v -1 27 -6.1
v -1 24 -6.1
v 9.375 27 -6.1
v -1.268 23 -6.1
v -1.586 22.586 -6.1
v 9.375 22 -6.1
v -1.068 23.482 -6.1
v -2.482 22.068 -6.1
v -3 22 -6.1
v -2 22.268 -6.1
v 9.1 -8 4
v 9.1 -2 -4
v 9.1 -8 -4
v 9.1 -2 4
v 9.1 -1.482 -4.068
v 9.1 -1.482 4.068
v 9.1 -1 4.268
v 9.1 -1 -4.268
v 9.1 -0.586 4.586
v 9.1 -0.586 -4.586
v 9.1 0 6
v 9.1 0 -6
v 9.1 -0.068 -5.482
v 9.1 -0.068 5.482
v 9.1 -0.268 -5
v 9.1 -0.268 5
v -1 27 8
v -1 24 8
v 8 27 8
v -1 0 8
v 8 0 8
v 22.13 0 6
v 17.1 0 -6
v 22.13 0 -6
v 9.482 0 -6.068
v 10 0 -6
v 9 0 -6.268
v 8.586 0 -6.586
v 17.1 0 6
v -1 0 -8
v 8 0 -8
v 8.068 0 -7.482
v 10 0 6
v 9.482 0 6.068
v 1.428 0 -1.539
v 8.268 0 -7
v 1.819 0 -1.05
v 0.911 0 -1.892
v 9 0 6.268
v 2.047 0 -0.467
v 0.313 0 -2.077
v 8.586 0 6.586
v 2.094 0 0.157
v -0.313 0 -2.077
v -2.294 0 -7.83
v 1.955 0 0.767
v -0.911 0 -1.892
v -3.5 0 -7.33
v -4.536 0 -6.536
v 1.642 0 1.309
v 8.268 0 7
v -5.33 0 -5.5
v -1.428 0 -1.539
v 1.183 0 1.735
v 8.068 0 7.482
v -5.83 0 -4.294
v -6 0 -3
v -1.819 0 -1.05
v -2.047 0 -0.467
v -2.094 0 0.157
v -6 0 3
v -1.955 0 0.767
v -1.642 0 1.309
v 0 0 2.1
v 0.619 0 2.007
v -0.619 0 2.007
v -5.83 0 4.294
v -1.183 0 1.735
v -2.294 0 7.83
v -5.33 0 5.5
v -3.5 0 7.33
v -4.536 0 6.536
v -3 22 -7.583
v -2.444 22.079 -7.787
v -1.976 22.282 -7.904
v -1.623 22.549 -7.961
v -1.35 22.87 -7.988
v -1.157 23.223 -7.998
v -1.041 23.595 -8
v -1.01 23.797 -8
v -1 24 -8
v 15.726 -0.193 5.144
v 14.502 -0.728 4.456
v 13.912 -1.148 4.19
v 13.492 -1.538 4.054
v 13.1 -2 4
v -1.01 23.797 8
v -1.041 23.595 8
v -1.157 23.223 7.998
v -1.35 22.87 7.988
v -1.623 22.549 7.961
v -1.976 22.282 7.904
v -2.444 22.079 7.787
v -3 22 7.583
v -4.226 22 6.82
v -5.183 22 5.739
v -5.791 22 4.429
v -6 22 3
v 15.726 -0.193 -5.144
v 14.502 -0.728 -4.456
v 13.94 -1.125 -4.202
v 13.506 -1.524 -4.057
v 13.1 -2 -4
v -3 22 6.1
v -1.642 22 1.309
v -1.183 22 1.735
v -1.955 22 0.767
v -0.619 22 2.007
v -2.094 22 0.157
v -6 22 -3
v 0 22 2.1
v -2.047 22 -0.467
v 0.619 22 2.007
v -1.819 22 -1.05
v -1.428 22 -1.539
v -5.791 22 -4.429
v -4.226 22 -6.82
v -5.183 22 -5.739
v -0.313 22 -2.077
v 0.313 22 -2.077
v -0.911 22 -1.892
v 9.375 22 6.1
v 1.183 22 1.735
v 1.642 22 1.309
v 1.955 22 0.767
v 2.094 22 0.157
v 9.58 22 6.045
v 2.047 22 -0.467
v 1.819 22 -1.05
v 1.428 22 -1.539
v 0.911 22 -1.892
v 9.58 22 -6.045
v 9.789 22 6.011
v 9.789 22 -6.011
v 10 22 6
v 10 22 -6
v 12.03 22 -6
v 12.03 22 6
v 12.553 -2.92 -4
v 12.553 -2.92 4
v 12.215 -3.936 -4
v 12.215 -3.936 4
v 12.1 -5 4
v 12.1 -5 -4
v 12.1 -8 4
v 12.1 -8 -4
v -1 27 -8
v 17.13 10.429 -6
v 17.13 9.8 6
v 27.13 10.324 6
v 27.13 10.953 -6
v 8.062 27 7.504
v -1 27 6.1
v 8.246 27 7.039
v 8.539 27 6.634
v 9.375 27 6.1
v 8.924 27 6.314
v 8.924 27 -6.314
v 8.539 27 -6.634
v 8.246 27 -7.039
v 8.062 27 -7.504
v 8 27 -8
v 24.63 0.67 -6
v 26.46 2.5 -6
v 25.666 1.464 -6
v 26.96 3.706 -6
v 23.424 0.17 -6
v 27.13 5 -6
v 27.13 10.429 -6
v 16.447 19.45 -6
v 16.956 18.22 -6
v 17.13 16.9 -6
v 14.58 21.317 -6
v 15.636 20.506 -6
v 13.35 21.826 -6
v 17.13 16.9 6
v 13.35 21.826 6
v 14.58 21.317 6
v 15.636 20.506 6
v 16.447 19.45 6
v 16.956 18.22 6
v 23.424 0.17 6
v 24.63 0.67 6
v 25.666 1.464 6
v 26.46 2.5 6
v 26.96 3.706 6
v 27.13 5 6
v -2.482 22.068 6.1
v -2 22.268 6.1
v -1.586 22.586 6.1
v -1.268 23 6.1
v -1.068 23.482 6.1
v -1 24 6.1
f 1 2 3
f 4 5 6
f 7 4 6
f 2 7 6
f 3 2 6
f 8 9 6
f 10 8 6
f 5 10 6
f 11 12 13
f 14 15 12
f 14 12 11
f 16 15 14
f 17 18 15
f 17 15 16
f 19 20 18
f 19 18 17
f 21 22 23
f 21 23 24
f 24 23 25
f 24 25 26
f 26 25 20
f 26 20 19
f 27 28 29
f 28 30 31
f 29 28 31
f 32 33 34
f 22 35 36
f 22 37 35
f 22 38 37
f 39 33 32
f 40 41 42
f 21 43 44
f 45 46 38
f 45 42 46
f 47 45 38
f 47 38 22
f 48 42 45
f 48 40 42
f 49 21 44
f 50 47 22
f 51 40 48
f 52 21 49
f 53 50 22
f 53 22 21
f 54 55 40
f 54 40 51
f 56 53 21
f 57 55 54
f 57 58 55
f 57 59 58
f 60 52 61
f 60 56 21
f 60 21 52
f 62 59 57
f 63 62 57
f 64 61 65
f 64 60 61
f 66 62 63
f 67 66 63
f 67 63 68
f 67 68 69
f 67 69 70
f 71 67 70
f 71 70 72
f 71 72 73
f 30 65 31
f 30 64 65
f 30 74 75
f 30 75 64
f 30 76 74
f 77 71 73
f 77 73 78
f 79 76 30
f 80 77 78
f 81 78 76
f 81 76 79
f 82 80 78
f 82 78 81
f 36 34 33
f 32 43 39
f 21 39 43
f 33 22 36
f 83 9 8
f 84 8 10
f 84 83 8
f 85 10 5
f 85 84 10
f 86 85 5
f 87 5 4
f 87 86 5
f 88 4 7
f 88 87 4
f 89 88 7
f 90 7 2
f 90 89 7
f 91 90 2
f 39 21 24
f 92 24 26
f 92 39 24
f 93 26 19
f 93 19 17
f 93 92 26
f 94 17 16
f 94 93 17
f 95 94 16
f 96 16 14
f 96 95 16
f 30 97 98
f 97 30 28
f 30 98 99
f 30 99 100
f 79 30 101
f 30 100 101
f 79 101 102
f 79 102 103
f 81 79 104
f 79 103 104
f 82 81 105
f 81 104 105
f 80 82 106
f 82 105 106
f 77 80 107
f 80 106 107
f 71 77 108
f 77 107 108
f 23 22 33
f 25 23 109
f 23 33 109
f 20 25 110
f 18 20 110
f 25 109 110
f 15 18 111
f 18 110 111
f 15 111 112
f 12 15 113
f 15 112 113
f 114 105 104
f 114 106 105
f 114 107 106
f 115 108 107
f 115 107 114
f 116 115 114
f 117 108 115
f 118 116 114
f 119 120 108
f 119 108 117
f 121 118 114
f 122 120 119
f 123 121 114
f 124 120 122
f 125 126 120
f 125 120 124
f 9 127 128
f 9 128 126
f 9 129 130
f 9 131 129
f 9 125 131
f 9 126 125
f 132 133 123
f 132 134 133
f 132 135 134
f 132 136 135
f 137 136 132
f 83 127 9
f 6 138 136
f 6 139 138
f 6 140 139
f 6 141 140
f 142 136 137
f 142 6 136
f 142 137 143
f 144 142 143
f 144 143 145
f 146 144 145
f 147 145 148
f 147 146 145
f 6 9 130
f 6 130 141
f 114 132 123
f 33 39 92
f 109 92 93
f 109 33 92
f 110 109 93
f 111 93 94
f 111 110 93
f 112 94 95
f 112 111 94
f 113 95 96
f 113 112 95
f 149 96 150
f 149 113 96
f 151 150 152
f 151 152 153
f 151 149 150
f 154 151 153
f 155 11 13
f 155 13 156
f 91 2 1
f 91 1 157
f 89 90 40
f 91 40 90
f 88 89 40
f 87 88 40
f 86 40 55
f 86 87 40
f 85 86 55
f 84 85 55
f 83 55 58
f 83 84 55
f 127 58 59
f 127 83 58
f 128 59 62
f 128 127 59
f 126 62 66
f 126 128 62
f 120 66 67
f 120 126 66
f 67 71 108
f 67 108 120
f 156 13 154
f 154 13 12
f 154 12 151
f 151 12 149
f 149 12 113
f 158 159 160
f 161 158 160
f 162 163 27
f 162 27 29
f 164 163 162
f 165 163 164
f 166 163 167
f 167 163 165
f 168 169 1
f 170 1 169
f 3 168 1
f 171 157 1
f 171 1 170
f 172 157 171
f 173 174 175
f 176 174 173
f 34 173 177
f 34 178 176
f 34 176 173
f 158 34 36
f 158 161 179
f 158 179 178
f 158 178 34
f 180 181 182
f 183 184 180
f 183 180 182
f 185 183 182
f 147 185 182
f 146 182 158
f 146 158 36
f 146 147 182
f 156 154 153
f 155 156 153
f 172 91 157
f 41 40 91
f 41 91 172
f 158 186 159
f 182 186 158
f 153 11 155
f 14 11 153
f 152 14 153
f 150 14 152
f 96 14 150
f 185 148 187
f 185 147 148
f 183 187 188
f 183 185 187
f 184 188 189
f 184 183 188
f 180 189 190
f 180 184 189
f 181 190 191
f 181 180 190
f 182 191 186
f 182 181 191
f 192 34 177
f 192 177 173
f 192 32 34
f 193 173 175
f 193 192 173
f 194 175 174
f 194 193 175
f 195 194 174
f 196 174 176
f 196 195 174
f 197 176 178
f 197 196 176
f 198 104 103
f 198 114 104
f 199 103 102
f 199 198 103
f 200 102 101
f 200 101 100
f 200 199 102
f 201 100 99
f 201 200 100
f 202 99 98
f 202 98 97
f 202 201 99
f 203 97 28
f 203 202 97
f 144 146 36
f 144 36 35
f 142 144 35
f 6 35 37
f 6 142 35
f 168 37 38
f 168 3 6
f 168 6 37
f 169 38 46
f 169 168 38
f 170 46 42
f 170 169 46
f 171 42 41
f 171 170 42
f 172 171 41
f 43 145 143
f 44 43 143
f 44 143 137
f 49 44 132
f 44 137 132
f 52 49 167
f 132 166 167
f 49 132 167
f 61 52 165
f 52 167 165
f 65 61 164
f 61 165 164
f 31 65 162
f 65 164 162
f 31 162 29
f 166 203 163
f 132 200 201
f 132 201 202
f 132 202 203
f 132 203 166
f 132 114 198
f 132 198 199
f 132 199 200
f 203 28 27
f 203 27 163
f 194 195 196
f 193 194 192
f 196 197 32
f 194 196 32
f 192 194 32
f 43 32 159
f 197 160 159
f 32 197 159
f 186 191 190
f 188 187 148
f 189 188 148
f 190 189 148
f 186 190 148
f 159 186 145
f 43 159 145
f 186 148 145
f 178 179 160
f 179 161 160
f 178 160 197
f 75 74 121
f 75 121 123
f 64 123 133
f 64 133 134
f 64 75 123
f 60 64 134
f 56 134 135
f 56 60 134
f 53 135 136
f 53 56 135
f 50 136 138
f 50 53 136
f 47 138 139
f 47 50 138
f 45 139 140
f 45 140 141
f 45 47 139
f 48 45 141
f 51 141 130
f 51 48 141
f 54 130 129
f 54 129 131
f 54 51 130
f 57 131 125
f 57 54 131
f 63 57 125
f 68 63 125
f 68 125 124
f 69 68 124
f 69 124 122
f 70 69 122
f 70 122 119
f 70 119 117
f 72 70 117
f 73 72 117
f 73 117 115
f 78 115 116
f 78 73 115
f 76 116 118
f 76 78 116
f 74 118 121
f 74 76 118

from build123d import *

# Parameters (mm, degrees)
SKETCH1_W           = 12
SKETCH1_H           = 16
SKETCH1_R           = 2.1
SKETCH1_W_2         = 2
BOSS_EXTRUDE1_DEPTH = 22
FILLET1_R           = 5
SKETCH2_W           = 9
SKETCH2_H           = 1.9
BOSS_EXTRUDE2_DEPTH = 5
SKETCH4_W           = 12
SKETCH4_H           = 22
BOSS_EXTRUDE3_DEPTH = 9.13
FILLET2_R           = 5.1
SKETCH5_W           = 3
SKETCH5_H           = 8
BOSS_EXTRUDE4_DEPTH = 8
FILLET3_R           = 2
BOSS_EXTRUDE5_DEPTH = 10
BOSS_EXTRUDE6_DEPTH = 12.016468152
FILLET4_R           = 5
FILLET5_R           = 2
FILLET6_R           = 5


with BuildPart() as part:
    # Sketch1 → Boss-Extrude1 (new body)
    # profile 1 of 2: a face of its own
    with BuildSketch(Plane(origin=(0, 0, 0), x_dir=(1, 0, 0), z_dir=(0, 1, 0))):
        Rectangle(SKETCH1_W, SKETCH1_H)
        with Locations(Location((0, 0, 0), (0, 0, 270))):
            Circle(SKETCH1_R, mode=Mode.SUBTRACT)
    # profile 2 of 2: a face of its own
    with BuildSketch(Plane(origin=(0, 0, 0), x_dir=(1, 0, 0), z_dir=(0, 1, 0))):
        with Locations((7, 0)):
            Rectangle(SKETCH1_W_2, SKETCH1_H)
    extrude(amount=BOSS_EXTRUDE1_DEPTH)

    # Fillet1
    fillet1_edges = [part.edges().sort_by_distance(p)[0] for p in [
        (-6, 11, 8),
        (-6, 11, -8),
    ]]
    fillet(fillet1_edges, radius=FILLET1_R)

    # Sketch2 → Boss-Extrude2 (add)
    with BuildSketch(Plane(origin=(0, 22, 0), x_dir=(1, 0, 0), z_dir=(0, 1, 0))):
        with Locations((3.5, 7.05)):
            Rectangle(SKETCH2_W, SKETCH2_H)
        with Locations((3.5, -7.05)):
            Rectangle(SKETCH2_W, SKETCH2_H)
    extrude(amount=BOSS_EXTRUDE2_DEPTH)

    # Sketch4 → Boss-Extrude3 (add)
    with BuildSketch(Plane(origin=(8, 0, 0), x_dir=(0, 0, -1), z_dir=(1, 0, 0))):
        with Locations((0, 11)):
            Rectangle(SKETCH4_W, SKETCH4_H)
    extrude(amount=BOSS_EXTRUDE3_DEPTH)

    # Fillet2
    fillet2_edges = [part.edges().sort_by_distance(p)[0] for p in [
        (17.13, 22, 0),
    ]]
    fillet(fillet2_edges, radius=FILLET2_R)

    # Sketch5 → Boss-Extrude4 (add)
    with BuildSketch(Plane.XZ):
        with Locations((10.6, 0)):
            Rectangle(SKETCH5_W, SKETCH5_H)
    extrude(amount=BOSS_EXTRUDE4_DEPTH)

    # Fillet3
    fillet3_edges = [part.edges().sort_by_distance(p)[0] for p in [
        (10.6, 0, 4),
        (10.6, 0, -4),
    ]]
    fillet(fillet3_edges, radius=FILLET3_R - 0.0001)  # a hair under: the kernel refuses the full size

    # Sketch6 → Boss-Extrude5 (add)
    with BuildSketch(Plane(origin=(17.13, 0, 0), x_dir=(0, 0, -1), z_dir=(1, 0, 0))):
        Polygon((-6, 9.8), (6, 10.428893351), (6, 0), (-6, 0), align=None)
    extrude(amount=BOSS_EXTRUDE5_DEPTH)

    # Sketch8 → Boss-Extrude6 (add, along a direction that is not the sketch's normal)
    with BuildSketch(Plane.XY.offset(6)):
        Polygon((17.13, 9.8), (27.13, 10.324077793), (27.13, 9.8), align=None)
    extrude(amount=-BOSS_EXTRUDE6_DEPTH, dir=(0, -0.052335956242944494, 0.9986295347545739))

    # Fillet4
    fillet4_edges = [part.edges().sort_by_distance(p)[0] for p in [
        (12.1, 0, 0),
    ]]
    fillet(fillet4_edges, radius=FILLET4_R)

    # Fillet5
    fillet5_edges = [part.edges().sort_by_distance(p)[0] for p in [
        (-1, 22, -7.05),
        (-1, 22, 7.05),
        (8, 11, -6),
        (8, 11, 6),
    ]]
    fillet(fillet5_edges, radius=FILLET5_R - 0.0001)  # a hair under: the kernel refuses the full size

    # Fillet6
    fillet6_edges = [part.edges().sort_by_distance(p)[0] for p in [
        (27.13, 0, 0),
    ]]
    fillet(fillet6_edges, radius=FILLET6_R)


solid = part.part
